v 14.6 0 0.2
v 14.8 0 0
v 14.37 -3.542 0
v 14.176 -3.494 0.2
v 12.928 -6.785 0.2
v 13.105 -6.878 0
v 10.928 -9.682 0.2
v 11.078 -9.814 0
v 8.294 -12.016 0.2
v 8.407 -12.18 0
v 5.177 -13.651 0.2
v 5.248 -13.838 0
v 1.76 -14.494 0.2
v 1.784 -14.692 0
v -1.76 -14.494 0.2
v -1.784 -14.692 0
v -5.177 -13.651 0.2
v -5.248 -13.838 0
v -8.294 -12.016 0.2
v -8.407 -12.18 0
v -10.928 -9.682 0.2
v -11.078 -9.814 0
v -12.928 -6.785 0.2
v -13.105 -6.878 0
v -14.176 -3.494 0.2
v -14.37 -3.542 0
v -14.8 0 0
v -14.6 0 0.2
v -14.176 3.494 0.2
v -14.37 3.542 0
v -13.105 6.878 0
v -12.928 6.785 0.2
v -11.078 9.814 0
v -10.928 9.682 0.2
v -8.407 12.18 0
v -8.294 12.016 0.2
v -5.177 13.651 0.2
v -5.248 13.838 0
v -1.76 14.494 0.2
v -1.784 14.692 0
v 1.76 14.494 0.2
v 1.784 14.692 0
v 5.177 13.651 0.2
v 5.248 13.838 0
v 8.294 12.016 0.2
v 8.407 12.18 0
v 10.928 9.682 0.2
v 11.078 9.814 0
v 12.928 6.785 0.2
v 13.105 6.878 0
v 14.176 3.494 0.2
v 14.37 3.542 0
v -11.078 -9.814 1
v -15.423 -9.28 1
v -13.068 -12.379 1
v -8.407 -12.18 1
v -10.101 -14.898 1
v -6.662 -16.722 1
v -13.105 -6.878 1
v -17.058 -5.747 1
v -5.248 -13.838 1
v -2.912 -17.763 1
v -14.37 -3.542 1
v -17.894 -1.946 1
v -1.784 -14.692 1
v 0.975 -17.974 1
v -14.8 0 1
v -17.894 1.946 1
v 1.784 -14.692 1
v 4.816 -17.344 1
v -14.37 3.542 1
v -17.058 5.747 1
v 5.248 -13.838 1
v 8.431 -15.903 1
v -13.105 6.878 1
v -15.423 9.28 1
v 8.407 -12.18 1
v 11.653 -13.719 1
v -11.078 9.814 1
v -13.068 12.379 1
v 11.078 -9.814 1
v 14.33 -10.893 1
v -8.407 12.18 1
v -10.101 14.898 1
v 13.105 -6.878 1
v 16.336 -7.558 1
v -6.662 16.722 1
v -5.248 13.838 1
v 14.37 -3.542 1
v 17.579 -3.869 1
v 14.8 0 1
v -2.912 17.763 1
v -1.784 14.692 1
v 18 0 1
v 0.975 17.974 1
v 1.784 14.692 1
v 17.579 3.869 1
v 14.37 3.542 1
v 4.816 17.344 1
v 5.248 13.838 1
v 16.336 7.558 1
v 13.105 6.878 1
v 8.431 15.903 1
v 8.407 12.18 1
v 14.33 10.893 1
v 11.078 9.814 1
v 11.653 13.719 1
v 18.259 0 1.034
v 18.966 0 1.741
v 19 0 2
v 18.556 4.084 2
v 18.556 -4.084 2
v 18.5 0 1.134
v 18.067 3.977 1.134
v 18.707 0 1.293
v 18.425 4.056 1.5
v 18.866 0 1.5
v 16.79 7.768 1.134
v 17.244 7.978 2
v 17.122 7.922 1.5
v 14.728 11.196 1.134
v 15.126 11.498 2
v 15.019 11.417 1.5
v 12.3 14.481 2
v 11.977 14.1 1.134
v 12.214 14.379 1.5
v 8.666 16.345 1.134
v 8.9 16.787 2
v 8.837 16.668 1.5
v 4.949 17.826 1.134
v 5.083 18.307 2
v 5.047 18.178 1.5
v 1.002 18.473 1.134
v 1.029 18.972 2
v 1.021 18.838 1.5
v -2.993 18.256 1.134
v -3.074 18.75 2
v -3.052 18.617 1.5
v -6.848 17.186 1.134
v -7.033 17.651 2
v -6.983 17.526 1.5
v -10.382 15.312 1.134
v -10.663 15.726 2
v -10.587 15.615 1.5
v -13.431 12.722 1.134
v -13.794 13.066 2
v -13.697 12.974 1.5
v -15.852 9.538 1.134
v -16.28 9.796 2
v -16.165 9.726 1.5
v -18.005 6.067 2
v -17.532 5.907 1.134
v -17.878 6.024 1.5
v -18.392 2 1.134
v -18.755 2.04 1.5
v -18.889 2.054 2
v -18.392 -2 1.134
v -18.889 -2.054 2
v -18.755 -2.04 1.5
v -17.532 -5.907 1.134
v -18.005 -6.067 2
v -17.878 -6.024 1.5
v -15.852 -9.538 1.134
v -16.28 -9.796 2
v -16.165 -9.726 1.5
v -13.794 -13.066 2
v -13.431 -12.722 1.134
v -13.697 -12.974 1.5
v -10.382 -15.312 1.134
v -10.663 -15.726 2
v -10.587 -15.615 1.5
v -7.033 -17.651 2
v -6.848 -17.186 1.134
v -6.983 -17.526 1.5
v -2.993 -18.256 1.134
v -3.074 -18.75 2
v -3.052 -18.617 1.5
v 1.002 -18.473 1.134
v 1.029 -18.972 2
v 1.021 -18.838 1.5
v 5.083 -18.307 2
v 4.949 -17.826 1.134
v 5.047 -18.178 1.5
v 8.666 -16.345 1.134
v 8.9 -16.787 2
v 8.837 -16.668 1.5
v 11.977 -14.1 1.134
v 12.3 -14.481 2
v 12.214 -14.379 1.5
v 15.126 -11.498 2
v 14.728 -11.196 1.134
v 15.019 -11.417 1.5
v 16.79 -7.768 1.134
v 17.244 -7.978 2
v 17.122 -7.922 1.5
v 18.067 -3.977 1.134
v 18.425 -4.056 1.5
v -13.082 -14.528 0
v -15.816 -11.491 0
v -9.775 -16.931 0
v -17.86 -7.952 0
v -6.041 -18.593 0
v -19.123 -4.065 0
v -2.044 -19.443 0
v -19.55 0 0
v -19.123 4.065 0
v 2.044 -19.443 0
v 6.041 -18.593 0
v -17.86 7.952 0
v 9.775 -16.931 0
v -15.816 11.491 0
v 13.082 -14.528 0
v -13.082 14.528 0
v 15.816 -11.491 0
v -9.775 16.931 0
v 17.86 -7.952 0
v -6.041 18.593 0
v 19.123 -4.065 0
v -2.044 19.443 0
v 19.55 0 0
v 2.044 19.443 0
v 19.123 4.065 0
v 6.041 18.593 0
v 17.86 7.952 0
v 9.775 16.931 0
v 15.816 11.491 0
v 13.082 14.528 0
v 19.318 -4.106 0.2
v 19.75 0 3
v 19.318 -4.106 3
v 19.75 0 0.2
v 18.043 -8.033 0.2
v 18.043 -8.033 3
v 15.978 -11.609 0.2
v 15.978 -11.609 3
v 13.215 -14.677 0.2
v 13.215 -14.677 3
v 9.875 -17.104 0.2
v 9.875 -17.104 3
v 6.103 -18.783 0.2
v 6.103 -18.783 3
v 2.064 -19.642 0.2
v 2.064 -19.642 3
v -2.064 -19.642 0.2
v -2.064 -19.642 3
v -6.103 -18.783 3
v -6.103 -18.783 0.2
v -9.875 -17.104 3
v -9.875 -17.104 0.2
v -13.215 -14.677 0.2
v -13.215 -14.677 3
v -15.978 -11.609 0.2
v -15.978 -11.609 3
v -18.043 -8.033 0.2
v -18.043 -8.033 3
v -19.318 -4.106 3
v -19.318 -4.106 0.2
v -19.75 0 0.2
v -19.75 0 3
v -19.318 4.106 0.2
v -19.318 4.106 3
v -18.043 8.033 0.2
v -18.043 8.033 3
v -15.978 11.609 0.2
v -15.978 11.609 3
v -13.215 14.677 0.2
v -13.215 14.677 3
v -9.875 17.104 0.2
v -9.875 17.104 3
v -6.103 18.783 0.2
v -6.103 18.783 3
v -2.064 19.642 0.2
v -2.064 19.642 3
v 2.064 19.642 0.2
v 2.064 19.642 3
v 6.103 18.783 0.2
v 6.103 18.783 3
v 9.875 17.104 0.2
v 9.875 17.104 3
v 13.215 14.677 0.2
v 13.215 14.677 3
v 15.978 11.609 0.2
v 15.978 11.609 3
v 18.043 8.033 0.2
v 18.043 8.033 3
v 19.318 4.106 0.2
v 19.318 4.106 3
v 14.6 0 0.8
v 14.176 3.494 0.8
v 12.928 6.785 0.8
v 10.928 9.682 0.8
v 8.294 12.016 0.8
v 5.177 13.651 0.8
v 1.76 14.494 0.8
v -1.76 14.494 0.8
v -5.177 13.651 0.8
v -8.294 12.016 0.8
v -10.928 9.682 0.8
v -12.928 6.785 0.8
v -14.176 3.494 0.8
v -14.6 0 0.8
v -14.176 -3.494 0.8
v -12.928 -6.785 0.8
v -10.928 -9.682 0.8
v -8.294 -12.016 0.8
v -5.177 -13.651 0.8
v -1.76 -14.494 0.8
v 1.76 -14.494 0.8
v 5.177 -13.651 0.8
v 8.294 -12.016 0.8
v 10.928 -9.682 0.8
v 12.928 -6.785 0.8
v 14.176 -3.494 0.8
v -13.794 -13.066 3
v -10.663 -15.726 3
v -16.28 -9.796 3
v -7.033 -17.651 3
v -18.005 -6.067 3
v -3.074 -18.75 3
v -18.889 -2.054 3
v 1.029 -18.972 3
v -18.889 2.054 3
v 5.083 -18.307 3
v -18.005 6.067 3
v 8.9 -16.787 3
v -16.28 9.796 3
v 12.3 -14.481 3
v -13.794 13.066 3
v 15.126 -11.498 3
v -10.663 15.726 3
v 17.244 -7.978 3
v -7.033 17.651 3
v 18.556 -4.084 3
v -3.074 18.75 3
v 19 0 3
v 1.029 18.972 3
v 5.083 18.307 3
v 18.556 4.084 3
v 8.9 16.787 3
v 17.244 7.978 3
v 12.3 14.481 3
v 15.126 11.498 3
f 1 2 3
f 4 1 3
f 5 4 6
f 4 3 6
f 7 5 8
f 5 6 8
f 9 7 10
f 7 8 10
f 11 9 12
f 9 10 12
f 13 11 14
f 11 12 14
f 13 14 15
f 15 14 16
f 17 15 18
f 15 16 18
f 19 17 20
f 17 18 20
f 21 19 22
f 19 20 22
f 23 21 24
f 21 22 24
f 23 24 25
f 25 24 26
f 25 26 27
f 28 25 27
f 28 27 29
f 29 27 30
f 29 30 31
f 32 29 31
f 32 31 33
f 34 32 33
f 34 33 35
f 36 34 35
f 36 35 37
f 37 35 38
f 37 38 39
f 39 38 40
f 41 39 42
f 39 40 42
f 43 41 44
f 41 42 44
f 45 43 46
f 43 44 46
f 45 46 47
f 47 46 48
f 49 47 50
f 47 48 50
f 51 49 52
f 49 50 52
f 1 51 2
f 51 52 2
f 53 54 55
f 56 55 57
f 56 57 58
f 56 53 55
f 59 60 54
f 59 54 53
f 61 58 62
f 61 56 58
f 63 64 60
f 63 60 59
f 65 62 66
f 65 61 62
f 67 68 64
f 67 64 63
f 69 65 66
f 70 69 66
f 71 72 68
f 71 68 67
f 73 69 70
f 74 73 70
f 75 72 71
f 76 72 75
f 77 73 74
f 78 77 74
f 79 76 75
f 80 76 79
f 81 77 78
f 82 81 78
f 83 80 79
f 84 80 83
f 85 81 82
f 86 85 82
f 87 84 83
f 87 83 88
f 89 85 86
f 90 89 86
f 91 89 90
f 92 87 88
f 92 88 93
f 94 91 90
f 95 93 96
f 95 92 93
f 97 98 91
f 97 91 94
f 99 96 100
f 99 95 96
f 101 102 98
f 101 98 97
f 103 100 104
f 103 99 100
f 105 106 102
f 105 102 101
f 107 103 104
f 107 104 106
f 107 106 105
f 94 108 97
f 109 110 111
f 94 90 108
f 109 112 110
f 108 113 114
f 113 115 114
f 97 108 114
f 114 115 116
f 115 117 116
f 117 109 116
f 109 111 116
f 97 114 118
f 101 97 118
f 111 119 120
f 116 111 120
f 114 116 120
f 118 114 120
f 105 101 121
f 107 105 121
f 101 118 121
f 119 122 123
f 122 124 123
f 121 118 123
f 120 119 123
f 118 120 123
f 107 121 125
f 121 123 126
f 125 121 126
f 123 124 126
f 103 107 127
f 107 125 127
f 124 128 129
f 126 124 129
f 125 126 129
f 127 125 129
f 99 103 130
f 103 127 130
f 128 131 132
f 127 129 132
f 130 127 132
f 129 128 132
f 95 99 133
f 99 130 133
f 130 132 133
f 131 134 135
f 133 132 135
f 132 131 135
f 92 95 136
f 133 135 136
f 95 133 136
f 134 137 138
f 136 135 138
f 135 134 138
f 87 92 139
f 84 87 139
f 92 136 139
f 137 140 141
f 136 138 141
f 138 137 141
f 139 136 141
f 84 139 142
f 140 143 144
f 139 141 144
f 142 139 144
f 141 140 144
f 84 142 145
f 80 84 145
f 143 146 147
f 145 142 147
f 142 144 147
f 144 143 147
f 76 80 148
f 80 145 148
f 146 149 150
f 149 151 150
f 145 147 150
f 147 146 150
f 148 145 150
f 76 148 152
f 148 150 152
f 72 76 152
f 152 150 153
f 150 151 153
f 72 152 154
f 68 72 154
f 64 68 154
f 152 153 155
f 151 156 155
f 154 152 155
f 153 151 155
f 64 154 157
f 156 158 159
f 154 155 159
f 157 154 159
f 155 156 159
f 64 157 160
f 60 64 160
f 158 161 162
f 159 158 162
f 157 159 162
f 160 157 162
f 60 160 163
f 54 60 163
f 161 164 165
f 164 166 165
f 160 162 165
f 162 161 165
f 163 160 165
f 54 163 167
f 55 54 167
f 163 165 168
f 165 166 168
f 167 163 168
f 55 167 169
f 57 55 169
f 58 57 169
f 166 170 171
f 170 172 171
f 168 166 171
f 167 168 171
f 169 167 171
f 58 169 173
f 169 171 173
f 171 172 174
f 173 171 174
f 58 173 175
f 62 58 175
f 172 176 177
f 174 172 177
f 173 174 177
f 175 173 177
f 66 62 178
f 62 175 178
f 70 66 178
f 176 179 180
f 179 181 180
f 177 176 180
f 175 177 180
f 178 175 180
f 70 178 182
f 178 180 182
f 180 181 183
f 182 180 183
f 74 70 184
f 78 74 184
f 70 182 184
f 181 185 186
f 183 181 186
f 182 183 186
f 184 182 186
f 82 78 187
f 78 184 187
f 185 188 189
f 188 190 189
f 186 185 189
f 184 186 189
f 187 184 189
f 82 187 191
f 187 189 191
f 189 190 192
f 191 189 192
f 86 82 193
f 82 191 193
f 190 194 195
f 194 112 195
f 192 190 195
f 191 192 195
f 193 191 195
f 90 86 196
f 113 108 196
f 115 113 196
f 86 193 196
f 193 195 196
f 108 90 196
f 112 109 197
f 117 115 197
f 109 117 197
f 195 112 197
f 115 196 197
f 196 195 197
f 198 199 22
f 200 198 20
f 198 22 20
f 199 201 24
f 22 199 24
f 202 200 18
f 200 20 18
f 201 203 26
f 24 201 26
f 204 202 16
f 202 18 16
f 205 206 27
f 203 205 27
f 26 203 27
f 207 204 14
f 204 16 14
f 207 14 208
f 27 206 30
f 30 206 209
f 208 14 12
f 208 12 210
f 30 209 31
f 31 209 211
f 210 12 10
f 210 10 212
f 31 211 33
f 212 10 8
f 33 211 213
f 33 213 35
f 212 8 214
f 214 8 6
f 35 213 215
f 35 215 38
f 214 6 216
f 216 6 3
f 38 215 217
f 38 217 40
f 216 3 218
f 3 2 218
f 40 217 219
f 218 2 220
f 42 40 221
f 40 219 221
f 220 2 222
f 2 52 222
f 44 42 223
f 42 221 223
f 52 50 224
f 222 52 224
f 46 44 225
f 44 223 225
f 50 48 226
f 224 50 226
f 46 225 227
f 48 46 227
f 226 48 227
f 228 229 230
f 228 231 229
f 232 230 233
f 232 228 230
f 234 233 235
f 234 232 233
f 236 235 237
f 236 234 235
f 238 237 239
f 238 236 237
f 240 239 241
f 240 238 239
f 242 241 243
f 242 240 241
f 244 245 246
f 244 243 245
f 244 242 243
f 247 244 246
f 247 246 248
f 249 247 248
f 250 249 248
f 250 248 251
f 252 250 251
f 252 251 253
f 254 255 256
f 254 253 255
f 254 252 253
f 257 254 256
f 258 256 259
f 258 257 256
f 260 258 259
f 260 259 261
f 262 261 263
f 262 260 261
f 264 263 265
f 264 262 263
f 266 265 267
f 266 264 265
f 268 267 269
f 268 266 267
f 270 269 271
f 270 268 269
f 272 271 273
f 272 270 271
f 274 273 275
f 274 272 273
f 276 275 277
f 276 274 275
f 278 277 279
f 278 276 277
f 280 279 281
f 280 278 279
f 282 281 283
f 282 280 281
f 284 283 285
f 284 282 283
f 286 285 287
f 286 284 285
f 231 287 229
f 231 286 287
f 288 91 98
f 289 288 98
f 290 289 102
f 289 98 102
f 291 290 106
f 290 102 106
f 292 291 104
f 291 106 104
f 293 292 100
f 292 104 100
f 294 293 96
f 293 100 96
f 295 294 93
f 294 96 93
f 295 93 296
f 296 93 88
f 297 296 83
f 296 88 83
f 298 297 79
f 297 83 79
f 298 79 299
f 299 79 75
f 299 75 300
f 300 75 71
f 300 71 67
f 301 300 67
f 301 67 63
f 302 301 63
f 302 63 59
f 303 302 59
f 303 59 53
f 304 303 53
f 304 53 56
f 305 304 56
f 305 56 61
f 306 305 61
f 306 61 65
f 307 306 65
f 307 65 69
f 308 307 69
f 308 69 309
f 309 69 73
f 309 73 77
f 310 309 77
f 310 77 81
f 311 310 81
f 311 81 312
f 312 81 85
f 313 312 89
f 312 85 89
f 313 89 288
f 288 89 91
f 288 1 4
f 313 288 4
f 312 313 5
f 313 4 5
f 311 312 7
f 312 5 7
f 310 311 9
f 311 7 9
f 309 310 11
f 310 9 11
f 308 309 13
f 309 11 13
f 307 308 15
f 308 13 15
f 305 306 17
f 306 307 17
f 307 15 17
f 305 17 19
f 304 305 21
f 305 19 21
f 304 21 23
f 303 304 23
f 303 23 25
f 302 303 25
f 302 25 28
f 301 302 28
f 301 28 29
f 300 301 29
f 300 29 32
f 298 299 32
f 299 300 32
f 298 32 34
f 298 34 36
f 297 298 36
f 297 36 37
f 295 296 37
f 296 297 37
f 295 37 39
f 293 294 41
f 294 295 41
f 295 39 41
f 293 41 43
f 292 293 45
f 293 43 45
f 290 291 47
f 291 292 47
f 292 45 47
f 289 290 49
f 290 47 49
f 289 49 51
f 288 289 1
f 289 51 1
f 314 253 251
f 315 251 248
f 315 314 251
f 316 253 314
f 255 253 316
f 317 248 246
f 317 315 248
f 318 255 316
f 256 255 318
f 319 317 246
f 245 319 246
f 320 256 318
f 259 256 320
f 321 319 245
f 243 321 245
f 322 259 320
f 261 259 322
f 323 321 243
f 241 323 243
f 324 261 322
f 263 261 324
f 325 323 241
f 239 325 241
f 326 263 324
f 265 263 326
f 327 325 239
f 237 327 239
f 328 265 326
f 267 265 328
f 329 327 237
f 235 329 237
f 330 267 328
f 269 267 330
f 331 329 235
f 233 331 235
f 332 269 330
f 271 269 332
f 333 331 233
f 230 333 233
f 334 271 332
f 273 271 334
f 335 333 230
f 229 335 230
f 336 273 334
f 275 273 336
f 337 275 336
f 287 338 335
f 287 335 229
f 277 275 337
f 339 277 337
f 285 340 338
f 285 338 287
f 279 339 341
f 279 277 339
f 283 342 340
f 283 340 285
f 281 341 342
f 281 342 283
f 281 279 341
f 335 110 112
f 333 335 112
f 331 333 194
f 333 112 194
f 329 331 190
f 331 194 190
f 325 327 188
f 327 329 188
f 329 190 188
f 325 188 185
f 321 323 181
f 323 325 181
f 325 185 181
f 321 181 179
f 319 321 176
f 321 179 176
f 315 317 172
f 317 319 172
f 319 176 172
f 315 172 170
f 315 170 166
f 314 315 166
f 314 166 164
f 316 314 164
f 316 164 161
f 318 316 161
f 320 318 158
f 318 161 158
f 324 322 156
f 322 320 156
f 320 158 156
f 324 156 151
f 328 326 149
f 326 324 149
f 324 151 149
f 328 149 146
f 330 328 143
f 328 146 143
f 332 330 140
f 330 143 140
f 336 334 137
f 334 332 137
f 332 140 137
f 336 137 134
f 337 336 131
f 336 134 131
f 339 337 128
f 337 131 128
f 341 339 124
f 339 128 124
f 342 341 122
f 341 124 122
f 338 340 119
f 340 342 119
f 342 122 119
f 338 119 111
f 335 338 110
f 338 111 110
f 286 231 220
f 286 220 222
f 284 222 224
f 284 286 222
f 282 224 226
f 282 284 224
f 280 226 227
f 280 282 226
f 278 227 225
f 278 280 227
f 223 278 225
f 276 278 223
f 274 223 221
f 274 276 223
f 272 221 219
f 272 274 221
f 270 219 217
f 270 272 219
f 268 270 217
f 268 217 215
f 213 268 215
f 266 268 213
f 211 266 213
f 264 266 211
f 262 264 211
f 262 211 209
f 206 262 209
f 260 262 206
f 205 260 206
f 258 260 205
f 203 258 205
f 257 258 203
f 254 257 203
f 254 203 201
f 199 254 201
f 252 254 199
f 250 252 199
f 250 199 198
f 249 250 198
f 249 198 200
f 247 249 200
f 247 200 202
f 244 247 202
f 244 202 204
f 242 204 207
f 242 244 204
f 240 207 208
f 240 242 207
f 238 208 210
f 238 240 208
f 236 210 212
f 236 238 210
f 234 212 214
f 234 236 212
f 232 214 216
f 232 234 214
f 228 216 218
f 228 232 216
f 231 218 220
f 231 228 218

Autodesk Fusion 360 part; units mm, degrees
sketch "Sketch1" plane through (0, 0, 0) normal (0, 0, 1) x (1, 0, 0)
  circle A0 centre (0, 0) radius 14.6
  circle A1 centre (0, 0) radius 19
  circle A2 centre (0, 0) radius 19.75
  dimension "d1" = 29.2
  dimension "d2" = 38
  dimension "d3" = 39.5
extrude "Extrude3" add sketch "Sketch1" along normal blind 1 contours A1
extrude "Extrude4" add sketch "Sketch1" along normal blind 3 contours A2
fillet "Fillet1" radius 1 1 edges at (-17.7142, -6.8707, 1)
chamfer "Chamfer1" distance 0.2 angle 45 1 edges at (-18.4135, -7.1419, 0)
chamfer "Chamfer2" distance 0.2 angle 45 2 edges at (-13.612, 5.2796, 1) (-13.612, 5.2796, 0)
extrude "Extrude1" [suppressed]
extrude "Extrude2" [suppressed]
